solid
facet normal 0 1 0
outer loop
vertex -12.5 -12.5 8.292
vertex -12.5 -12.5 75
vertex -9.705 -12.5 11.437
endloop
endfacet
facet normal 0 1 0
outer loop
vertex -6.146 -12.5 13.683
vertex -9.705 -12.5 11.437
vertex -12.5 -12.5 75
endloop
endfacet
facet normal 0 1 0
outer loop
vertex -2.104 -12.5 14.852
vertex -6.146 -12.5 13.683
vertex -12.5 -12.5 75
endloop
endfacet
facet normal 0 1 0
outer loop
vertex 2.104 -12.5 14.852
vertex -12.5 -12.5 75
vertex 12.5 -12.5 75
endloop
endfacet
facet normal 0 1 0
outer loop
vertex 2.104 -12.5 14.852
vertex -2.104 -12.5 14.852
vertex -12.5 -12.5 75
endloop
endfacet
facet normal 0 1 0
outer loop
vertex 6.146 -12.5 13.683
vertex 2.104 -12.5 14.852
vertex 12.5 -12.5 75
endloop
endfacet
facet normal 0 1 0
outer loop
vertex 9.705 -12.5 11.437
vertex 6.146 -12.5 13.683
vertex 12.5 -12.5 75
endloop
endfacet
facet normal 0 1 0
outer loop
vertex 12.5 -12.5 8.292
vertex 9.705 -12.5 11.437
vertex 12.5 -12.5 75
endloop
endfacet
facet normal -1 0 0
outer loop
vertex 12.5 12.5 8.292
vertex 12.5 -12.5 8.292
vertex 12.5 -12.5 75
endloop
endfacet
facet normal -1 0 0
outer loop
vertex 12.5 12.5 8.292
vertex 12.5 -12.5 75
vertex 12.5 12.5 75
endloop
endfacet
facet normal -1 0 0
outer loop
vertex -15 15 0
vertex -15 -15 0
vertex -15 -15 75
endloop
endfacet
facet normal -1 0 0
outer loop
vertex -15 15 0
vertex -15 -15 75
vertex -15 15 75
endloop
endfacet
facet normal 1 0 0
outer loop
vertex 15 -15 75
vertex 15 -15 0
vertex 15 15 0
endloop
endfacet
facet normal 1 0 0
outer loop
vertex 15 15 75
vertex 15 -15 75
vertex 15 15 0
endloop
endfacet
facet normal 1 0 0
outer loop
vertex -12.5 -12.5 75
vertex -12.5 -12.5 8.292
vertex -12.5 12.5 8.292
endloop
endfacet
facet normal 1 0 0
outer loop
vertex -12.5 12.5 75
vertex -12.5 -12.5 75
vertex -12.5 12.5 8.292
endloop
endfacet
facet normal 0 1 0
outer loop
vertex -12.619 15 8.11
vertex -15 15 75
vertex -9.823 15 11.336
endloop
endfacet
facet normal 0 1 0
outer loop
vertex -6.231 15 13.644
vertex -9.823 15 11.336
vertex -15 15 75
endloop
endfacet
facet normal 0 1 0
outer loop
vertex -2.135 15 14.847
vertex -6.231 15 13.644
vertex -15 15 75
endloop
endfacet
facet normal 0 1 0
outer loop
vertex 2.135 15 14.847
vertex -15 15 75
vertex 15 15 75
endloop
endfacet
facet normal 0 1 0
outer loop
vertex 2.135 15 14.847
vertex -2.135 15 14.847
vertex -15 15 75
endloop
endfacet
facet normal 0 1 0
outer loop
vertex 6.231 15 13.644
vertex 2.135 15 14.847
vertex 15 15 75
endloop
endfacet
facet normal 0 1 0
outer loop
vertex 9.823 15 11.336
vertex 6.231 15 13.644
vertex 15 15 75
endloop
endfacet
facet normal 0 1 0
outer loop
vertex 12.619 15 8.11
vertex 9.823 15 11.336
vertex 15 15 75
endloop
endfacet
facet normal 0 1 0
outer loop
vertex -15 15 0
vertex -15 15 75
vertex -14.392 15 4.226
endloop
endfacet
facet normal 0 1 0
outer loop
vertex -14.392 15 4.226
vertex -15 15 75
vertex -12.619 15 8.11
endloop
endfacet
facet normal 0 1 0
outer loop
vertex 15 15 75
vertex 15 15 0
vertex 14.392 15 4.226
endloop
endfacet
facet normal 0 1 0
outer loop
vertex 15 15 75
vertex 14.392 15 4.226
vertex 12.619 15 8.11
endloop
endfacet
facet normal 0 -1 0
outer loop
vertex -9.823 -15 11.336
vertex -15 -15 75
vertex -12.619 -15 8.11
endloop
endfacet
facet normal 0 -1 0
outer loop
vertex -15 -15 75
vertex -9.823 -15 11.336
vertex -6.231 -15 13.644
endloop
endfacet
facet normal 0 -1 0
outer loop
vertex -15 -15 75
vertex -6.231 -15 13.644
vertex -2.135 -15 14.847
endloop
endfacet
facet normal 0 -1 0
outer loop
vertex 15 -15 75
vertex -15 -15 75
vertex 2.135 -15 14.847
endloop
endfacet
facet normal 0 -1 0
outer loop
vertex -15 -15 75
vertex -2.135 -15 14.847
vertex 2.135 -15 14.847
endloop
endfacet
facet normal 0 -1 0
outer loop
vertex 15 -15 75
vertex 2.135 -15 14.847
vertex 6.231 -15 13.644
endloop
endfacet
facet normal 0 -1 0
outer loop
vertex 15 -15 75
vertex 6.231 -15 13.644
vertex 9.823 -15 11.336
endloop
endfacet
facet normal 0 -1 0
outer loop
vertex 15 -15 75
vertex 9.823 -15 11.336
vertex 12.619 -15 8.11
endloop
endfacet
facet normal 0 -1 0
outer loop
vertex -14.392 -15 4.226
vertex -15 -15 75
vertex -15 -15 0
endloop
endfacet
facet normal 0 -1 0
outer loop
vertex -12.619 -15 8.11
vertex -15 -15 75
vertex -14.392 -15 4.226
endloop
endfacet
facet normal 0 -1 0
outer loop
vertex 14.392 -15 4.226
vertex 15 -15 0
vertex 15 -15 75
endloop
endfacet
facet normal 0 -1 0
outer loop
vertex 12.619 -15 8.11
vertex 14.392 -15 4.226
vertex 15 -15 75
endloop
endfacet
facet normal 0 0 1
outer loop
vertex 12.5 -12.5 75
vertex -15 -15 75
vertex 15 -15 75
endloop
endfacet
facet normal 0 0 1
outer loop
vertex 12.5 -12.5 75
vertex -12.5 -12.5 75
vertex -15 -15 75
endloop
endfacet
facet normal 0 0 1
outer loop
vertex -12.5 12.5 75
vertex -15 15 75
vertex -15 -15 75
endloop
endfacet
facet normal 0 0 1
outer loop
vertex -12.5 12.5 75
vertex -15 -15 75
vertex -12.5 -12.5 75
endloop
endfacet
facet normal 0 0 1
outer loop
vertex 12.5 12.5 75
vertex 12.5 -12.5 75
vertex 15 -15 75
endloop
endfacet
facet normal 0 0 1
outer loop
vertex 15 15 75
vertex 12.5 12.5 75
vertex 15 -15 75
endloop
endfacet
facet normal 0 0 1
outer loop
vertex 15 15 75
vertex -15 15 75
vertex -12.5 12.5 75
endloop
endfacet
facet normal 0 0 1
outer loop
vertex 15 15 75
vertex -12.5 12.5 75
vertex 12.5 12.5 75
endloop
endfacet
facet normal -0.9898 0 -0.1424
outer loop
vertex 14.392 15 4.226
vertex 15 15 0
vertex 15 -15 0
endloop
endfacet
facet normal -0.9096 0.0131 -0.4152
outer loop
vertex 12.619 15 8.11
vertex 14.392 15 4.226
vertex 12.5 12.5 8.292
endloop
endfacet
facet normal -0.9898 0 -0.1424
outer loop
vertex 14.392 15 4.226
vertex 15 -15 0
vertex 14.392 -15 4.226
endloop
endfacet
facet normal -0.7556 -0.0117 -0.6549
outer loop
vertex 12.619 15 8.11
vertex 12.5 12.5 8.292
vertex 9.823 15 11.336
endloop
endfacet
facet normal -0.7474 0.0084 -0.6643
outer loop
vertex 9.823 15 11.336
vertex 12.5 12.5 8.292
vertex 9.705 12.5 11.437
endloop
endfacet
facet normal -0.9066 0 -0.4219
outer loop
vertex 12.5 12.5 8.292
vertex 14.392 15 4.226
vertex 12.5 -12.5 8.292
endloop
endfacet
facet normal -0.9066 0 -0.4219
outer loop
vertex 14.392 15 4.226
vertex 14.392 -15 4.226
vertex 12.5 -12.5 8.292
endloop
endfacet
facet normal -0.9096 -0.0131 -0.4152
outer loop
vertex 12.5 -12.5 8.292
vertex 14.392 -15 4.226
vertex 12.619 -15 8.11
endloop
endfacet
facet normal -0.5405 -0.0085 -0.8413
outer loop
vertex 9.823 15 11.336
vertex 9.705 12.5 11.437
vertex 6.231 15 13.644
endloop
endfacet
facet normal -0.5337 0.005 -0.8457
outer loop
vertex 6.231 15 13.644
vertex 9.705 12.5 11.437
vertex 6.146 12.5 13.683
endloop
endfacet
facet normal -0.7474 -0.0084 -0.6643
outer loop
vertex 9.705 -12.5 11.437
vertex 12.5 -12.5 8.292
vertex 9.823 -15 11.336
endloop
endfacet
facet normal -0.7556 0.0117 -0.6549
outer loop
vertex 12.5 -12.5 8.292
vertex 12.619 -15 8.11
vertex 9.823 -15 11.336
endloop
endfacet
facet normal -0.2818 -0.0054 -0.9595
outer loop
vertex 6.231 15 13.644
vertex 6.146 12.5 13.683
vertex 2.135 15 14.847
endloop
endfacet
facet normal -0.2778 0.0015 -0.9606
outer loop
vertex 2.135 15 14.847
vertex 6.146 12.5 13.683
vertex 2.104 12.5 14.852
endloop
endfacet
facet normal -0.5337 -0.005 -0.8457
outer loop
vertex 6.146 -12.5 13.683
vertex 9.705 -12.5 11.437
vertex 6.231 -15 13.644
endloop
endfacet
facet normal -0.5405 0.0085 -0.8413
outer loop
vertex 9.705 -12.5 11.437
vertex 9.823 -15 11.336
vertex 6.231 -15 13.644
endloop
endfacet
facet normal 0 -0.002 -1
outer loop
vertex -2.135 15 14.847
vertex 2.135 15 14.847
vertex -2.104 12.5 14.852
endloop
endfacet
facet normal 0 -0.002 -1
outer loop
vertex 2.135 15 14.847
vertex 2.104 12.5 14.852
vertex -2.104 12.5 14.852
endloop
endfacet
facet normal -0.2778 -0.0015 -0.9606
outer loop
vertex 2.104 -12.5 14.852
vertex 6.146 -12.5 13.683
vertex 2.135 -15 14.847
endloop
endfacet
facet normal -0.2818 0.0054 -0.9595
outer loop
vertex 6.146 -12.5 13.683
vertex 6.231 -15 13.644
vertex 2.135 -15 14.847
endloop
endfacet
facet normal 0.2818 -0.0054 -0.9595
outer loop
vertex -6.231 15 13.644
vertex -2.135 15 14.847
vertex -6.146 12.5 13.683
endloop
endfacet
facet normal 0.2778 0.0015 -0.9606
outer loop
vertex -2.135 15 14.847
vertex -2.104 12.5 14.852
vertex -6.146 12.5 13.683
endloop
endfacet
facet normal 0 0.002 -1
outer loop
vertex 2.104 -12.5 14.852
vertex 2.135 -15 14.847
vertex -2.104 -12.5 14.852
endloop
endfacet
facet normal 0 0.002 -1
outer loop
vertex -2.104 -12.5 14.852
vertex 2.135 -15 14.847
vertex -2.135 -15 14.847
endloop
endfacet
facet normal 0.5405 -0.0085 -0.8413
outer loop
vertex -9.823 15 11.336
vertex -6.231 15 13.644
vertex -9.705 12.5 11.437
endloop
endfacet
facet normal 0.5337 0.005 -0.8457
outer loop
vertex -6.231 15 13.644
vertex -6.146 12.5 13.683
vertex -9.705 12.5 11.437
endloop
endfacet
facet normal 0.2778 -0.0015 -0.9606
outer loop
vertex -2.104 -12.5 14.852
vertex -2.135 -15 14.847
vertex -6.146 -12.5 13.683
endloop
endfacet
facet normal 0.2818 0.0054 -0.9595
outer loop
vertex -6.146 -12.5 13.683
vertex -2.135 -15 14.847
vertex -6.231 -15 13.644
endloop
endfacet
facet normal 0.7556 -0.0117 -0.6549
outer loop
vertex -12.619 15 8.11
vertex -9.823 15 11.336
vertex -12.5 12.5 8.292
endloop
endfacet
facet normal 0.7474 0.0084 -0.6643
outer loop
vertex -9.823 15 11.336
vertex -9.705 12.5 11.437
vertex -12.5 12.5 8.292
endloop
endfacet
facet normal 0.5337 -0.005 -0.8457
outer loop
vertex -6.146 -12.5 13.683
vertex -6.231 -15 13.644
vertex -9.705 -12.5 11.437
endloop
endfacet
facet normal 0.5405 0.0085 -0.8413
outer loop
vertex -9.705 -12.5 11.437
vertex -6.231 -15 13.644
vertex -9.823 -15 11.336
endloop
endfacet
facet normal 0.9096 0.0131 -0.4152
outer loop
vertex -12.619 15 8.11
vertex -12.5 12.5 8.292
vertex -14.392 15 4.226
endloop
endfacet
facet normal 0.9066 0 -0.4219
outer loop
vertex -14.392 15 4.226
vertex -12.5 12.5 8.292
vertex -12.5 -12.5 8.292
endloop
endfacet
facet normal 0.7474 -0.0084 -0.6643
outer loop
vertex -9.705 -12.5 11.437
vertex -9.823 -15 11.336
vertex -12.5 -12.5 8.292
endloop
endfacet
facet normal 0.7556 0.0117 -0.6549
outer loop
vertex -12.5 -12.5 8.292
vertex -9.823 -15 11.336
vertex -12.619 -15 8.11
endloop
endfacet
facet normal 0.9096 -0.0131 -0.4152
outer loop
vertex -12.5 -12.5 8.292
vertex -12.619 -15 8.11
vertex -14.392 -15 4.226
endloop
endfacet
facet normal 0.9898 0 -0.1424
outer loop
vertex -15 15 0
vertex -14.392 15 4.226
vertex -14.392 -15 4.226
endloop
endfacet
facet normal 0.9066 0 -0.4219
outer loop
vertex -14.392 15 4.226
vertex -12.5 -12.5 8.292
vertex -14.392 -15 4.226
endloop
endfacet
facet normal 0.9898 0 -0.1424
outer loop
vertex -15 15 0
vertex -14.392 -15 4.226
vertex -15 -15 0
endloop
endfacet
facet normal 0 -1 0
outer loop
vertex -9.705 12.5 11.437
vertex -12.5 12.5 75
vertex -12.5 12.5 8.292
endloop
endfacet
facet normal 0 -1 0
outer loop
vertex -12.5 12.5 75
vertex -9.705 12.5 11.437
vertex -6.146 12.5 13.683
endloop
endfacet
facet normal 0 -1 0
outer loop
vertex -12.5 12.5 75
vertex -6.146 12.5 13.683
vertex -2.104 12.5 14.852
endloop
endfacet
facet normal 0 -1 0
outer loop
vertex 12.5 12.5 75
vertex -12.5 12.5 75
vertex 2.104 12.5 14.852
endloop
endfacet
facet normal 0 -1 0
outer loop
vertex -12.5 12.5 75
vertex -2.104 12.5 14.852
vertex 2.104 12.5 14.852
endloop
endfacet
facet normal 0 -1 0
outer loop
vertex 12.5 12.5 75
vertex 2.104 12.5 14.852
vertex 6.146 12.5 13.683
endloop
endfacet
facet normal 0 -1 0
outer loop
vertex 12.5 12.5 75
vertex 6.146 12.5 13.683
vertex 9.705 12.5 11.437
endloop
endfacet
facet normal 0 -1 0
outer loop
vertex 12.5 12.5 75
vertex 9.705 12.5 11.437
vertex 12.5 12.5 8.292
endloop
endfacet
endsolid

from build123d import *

# Parameters (mm, degrees)
SKETCH1_W           = 30
SKETCH1_H           = 30
SKETCH1_W_2         = 25
SKETCH1_H_2         = 25
BOSS_EXTRUDE1_DEPTH = 75
SKETCH2_R           = 15
CUT_EXTRUDE1_DEPTH  = 83.158383626


with BuildPart() as part:
    # Sketch1 → Boss-Extrude1 (new body)
    with BuildSketch(Plane.XY):
        Rectangle(SKETCH1_W, SKETCH1_H)
        Rectangle(SKETCH1_W_2, SKETCH1_H_2, mode=Mode.SUBTRACT)
    extrude(amount=BOSS_EXTRUDE1_DEPTH)

    # Sketch2 → Cut-Extrude1 (cut, through all)
    with BuildSketch(Plane.XZ.offset(15)):
        Circle(SKETCH2_R)
    extrude(amount=-CUT_EXTRUDE1_DEPTH, mode=Mode.SUBTRACT)


solid = part.part
